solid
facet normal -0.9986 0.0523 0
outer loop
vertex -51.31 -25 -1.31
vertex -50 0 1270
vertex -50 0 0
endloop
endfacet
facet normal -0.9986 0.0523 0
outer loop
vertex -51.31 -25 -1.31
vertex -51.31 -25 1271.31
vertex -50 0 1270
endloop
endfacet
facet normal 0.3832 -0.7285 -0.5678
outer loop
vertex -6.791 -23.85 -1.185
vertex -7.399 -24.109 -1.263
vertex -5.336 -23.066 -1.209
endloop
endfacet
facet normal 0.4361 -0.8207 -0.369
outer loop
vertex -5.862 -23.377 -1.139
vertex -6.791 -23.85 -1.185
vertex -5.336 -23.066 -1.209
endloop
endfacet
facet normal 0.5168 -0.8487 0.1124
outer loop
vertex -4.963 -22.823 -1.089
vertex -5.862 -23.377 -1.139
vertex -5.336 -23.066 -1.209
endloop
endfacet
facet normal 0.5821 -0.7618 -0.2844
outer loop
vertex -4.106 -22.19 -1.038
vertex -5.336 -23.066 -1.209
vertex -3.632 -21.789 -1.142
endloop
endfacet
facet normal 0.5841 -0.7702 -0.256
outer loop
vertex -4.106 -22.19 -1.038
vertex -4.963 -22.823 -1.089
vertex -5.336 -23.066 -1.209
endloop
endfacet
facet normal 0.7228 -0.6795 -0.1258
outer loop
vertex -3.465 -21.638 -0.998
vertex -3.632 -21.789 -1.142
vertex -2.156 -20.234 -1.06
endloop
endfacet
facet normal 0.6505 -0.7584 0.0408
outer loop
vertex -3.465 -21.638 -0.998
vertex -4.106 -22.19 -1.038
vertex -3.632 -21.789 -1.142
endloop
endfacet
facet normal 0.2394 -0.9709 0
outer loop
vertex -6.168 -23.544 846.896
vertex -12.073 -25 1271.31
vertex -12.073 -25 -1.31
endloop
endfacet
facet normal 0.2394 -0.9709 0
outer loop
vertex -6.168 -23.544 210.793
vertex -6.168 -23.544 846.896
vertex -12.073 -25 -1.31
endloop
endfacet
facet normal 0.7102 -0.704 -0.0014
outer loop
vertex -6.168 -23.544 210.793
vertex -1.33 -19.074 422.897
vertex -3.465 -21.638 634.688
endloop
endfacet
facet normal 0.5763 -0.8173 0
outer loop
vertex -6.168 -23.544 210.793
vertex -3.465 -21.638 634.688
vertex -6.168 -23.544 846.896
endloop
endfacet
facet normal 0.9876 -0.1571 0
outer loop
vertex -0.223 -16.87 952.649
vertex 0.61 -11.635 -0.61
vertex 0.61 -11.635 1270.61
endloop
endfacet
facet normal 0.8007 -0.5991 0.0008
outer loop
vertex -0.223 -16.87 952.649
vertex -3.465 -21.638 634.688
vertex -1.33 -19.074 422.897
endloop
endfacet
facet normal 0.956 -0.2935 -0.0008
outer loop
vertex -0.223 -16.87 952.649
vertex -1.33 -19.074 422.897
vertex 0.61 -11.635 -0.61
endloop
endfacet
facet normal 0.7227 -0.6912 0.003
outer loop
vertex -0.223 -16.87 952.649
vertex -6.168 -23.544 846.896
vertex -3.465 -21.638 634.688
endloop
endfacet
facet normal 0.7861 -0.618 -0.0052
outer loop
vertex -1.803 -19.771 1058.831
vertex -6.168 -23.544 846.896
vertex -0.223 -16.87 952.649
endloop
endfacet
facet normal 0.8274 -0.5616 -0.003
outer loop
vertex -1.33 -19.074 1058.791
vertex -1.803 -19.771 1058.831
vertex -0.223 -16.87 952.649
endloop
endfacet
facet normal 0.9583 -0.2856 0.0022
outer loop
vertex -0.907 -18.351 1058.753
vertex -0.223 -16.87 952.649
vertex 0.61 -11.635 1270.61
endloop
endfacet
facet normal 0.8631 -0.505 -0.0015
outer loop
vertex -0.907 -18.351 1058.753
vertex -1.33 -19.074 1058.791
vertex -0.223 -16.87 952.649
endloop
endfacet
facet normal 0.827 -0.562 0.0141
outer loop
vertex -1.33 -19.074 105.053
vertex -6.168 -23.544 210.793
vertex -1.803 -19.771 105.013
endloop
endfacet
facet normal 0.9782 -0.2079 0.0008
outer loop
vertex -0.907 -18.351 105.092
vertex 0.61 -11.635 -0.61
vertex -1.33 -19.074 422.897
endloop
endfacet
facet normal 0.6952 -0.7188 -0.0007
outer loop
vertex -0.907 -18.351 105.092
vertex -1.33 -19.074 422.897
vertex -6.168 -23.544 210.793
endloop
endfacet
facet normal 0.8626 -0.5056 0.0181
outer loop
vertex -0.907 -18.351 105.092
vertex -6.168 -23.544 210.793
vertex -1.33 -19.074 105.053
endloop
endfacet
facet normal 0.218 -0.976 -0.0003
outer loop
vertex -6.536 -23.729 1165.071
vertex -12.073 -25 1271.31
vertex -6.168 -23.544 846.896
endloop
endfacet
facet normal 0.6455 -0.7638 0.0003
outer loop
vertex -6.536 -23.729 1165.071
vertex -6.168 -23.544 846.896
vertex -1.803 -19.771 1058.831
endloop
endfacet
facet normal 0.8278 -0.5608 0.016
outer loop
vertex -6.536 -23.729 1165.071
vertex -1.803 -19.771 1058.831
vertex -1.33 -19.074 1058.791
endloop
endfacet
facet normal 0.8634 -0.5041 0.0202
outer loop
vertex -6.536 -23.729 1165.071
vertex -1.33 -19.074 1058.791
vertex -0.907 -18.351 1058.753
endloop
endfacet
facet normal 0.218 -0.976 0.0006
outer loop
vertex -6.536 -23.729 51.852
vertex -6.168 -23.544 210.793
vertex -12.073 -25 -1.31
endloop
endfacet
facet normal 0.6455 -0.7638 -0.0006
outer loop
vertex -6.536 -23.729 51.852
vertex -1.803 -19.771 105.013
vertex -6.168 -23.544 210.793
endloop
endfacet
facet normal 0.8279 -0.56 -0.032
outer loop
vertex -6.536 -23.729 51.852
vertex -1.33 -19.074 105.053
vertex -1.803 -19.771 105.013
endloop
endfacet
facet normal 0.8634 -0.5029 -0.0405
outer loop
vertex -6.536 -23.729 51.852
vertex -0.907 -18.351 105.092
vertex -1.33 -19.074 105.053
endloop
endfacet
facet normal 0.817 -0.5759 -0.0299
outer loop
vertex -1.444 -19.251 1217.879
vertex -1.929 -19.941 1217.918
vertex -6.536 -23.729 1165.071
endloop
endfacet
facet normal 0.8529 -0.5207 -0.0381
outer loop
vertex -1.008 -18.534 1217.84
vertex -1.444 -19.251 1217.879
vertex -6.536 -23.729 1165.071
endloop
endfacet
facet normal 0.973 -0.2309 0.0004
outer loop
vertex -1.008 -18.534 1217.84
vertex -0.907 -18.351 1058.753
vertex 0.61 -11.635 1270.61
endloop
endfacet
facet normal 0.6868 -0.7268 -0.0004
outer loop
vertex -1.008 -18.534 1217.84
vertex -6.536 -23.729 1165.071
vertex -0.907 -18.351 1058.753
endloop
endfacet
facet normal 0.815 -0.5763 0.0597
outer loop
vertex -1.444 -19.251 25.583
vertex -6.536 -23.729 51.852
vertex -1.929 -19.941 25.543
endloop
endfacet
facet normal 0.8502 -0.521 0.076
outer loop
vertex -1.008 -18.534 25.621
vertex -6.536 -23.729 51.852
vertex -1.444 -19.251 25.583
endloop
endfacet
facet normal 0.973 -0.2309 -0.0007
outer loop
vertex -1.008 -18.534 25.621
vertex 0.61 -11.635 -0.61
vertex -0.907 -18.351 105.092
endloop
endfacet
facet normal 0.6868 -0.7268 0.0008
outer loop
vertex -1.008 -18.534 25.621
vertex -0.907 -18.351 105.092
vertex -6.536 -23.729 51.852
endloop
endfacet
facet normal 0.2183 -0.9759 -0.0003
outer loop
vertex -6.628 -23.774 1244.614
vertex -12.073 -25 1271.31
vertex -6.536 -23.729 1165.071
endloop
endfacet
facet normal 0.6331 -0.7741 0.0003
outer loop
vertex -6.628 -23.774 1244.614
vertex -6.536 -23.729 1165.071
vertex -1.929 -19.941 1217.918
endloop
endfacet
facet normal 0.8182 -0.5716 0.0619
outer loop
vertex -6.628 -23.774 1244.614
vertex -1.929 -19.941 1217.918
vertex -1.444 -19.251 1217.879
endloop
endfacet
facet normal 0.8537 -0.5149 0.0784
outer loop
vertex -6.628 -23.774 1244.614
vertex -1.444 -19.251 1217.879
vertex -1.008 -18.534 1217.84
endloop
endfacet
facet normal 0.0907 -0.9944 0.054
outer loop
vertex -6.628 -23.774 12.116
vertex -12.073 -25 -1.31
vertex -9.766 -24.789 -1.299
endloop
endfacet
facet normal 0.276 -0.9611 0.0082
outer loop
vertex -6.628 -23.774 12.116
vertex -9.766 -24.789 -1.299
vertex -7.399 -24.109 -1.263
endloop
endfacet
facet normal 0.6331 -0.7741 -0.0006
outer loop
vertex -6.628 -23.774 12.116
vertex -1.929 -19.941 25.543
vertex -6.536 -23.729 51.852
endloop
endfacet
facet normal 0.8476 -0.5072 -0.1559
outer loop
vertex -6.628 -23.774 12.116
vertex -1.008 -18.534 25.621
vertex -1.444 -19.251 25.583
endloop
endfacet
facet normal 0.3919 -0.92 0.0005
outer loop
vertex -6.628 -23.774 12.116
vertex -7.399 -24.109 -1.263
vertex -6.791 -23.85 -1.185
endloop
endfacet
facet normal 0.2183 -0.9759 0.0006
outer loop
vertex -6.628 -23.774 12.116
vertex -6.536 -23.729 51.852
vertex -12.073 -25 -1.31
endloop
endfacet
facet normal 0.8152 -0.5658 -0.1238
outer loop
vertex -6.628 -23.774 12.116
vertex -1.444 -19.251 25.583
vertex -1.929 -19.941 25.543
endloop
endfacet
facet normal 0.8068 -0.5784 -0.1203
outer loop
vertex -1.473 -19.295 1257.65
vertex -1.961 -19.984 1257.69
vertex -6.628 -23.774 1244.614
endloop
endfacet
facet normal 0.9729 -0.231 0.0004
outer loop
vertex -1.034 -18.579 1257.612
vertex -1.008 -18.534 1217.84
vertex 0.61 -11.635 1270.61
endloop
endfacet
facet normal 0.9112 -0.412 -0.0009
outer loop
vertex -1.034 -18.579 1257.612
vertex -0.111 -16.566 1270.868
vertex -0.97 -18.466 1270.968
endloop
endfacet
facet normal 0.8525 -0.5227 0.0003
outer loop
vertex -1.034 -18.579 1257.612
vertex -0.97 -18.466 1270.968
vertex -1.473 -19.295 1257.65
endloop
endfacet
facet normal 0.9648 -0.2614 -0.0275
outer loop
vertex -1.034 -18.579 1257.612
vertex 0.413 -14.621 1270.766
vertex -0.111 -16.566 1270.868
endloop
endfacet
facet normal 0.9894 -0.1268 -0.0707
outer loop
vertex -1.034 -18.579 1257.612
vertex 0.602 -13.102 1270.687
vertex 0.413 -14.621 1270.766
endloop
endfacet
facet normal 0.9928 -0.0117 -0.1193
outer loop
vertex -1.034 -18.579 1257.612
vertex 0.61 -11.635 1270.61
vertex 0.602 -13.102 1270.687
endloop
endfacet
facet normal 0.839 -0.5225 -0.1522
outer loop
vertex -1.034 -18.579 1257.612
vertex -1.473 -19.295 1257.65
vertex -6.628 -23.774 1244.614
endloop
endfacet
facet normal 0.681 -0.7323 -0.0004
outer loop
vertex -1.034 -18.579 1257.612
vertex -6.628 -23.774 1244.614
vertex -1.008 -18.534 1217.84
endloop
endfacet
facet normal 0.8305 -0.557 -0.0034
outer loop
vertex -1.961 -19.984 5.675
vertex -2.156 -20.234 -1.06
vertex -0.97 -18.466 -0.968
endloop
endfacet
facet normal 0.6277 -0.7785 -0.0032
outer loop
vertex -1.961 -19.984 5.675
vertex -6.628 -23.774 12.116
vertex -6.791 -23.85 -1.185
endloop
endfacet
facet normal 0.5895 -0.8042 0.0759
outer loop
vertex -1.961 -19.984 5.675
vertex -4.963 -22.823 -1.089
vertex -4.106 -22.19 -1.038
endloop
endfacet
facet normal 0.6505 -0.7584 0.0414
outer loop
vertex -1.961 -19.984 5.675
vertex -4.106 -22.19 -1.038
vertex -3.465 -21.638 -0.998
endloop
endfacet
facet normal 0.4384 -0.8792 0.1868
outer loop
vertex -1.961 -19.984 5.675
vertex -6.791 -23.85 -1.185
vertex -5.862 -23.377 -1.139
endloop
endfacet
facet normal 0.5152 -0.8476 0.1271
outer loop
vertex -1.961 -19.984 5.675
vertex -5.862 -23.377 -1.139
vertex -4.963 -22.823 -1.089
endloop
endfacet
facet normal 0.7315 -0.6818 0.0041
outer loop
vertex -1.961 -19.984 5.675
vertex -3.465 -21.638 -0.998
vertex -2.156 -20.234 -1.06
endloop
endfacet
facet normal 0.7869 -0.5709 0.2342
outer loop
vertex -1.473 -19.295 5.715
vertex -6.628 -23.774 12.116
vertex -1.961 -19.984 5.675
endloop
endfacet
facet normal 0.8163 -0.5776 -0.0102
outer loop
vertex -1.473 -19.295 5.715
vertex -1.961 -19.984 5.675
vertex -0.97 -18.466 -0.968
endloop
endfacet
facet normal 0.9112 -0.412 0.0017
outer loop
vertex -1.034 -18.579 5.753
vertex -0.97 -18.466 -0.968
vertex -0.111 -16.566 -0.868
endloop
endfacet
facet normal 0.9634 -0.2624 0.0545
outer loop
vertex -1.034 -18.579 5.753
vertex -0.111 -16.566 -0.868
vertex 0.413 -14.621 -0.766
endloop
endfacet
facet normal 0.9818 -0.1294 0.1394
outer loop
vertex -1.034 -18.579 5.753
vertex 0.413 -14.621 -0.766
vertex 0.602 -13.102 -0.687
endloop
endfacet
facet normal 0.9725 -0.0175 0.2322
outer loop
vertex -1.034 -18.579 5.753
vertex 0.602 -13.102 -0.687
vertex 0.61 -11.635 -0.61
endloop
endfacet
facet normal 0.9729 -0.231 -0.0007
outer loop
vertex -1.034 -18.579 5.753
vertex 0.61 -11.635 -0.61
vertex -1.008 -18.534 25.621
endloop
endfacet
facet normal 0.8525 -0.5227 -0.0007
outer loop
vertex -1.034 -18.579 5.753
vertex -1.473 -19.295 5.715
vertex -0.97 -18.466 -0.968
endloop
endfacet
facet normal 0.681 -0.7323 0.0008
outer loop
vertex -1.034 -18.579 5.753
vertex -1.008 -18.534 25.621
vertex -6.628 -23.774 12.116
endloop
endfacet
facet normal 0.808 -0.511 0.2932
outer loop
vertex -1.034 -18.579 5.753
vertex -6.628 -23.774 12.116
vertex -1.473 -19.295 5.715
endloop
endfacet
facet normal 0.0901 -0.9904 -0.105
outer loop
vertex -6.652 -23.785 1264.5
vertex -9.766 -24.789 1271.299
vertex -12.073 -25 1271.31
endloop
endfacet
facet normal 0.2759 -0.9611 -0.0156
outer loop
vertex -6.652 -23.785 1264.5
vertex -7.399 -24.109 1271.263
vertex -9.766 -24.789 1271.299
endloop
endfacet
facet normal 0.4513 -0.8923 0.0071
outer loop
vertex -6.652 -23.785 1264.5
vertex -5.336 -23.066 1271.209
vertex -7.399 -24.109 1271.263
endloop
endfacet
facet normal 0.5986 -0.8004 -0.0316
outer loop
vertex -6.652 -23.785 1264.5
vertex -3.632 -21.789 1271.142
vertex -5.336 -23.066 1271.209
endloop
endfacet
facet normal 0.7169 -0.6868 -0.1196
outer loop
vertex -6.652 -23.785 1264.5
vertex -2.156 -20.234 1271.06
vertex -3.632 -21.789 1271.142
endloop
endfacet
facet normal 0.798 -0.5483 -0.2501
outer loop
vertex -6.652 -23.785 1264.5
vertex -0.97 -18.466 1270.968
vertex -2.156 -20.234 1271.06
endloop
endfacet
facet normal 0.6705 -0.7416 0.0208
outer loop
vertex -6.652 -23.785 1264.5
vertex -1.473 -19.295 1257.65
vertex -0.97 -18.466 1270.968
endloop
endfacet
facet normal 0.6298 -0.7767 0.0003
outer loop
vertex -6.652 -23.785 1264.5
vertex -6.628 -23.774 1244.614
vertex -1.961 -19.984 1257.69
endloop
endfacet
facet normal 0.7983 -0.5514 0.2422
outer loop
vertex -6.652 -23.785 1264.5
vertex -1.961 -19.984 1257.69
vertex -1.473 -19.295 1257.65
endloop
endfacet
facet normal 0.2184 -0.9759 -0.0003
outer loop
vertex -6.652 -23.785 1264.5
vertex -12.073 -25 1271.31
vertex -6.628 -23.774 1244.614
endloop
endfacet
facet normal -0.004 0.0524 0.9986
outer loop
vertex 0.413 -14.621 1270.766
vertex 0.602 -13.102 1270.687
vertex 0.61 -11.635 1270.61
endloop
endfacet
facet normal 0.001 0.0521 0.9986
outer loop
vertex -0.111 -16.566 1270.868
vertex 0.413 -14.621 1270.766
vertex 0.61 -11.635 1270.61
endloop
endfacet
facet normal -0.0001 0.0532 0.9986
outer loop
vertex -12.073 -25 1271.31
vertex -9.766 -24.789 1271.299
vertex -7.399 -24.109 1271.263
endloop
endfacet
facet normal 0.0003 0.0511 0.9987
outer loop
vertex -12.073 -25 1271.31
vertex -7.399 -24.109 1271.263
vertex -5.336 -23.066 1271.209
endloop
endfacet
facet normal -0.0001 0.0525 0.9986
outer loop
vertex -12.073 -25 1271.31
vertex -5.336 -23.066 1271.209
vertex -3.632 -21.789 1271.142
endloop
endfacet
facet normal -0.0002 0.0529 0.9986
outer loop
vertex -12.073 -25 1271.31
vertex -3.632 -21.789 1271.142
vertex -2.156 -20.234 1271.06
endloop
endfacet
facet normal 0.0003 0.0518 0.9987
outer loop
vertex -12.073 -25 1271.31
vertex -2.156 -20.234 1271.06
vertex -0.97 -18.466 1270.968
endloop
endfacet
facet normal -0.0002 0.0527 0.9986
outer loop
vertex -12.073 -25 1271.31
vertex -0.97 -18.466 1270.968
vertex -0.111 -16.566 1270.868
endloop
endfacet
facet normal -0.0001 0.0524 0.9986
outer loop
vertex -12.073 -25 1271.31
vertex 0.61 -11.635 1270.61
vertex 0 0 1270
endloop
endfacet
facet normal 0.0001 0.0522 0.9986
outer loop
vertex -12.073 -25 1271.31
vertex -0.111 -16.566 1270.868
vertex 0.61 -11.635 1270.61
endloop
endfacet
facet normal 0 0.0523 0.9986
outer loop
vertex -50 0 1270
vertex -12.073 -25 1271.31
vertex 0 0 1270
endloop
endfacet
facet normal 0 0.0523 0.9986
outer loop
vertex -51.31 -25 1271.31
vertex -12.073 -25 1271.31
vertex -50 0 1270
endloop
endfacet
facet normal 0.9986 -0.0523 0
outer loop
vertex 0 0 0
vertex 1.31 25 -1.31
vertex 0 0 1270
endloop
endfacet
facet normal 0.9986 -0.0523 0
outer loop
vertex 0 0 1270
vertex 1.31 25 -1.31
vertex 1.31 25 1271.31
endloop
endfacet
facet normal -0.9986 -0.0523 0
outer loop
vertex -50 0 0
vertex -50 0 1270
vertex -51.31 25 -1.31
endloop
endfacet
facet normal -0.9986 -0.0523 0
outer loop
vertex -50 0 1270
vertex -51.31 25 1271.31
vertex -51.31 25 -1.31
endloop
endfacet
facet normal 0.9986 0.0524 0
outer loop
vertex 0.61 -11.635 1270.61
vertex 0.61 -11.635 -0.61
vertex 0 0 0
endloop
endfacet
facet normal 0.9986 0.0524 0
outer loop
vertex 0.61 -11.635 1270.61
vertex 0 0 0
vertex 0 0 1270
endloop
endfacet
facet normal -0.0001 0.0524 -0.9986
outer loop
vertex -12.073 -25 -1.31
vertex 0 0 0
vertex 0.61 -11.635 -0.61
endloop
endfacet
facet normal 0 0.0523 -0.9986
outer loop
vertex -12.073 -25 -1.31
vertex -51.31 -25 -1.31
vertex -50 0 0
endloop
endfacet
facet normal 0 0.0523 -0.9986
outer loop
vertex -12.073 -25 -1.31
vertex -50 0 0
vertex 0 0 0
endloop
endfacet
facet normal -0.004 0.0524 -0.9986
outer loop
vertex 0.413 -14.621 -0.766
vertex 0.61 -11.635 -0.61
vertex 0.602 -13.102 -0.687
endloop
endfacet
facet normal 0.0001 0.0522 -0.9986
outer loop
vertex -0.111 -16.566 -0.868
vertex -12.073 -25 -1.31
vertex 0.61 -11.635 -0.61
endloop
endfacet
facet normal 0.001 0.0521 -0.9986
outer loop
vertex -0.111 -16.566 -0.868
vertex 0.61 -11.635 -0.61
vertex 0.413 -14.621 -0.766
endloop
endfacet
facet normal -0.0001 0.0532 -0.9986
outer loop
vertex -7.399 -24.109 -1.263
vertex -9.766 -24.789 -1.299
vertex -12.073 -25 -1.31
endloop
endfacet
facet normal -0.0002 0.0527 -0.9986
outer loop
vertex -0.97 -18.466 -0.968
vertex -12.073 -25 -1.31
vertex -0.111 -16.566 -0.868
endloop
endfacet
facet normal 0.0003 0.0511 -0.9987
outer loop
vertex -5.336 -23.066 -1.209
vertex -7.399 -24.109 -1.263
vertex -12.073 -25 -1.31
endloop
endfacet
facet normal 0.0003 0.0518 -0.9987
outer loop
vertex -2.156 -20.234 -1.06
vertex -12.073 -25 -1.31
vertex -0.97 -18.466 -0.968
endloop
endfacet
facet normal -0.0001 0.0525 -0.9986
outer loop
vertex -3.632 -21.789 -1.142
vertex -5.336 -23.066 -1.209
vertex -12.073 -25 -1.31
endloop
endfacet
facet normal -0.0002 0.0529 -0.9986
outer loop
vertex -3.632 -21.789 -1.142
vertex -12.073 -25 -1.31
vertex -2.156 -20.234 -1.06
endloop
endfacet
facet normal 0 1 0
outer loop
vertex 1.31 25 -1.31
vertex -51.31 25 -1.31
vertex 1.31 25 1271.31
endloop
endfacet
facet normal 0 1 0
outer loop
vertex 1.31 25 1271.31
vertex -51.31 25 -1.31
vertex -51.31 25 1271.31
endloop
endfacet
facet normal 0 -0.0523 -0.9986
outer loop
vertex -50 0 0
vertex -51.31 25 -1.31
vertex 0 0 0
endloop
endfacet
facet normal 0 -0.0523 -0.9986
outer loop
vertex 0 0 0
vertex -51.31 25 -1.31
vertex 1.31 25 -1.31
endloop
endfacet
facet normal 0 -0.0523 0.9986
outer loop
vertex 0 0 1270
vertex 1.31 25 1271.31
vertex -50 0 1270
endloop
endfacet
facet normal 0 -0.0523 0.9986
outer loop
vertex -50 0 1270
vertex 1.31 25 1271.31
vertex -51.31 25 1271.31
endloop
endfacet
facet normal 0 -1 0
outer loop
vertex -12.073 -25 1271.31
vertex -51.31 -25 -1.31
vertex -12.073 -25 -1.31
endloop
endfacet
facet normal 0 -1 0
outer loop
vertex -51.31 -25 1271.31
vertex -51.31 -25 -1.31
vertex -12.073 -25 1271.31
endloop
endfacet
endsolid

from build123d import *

# Parameters (mm, degrees)
F0_W     = 50
F0_H     = 1270
F1_DEPTH = 25
F1_TAPER = -3
F2_R     = 12.7


with BuildPart() as f1:
    # F0 (on Front) → F1 (new body, symmetric)
    with BuildSketch(Plane.XZ):
        with Locations((-25, 635)):
            Rectangle(F0_W, F0_H)
    extrude(amount=F1_DEPTH, both=True, taper=F1_TAPER)

    # F2
    f2_edges = [f1.edges().sort_by_distance(p)[0] for p in [
        (1.310194, -25, 635),
    ]]
    fillet(f2_edges, radius=F2_R)


solid = f1.part
